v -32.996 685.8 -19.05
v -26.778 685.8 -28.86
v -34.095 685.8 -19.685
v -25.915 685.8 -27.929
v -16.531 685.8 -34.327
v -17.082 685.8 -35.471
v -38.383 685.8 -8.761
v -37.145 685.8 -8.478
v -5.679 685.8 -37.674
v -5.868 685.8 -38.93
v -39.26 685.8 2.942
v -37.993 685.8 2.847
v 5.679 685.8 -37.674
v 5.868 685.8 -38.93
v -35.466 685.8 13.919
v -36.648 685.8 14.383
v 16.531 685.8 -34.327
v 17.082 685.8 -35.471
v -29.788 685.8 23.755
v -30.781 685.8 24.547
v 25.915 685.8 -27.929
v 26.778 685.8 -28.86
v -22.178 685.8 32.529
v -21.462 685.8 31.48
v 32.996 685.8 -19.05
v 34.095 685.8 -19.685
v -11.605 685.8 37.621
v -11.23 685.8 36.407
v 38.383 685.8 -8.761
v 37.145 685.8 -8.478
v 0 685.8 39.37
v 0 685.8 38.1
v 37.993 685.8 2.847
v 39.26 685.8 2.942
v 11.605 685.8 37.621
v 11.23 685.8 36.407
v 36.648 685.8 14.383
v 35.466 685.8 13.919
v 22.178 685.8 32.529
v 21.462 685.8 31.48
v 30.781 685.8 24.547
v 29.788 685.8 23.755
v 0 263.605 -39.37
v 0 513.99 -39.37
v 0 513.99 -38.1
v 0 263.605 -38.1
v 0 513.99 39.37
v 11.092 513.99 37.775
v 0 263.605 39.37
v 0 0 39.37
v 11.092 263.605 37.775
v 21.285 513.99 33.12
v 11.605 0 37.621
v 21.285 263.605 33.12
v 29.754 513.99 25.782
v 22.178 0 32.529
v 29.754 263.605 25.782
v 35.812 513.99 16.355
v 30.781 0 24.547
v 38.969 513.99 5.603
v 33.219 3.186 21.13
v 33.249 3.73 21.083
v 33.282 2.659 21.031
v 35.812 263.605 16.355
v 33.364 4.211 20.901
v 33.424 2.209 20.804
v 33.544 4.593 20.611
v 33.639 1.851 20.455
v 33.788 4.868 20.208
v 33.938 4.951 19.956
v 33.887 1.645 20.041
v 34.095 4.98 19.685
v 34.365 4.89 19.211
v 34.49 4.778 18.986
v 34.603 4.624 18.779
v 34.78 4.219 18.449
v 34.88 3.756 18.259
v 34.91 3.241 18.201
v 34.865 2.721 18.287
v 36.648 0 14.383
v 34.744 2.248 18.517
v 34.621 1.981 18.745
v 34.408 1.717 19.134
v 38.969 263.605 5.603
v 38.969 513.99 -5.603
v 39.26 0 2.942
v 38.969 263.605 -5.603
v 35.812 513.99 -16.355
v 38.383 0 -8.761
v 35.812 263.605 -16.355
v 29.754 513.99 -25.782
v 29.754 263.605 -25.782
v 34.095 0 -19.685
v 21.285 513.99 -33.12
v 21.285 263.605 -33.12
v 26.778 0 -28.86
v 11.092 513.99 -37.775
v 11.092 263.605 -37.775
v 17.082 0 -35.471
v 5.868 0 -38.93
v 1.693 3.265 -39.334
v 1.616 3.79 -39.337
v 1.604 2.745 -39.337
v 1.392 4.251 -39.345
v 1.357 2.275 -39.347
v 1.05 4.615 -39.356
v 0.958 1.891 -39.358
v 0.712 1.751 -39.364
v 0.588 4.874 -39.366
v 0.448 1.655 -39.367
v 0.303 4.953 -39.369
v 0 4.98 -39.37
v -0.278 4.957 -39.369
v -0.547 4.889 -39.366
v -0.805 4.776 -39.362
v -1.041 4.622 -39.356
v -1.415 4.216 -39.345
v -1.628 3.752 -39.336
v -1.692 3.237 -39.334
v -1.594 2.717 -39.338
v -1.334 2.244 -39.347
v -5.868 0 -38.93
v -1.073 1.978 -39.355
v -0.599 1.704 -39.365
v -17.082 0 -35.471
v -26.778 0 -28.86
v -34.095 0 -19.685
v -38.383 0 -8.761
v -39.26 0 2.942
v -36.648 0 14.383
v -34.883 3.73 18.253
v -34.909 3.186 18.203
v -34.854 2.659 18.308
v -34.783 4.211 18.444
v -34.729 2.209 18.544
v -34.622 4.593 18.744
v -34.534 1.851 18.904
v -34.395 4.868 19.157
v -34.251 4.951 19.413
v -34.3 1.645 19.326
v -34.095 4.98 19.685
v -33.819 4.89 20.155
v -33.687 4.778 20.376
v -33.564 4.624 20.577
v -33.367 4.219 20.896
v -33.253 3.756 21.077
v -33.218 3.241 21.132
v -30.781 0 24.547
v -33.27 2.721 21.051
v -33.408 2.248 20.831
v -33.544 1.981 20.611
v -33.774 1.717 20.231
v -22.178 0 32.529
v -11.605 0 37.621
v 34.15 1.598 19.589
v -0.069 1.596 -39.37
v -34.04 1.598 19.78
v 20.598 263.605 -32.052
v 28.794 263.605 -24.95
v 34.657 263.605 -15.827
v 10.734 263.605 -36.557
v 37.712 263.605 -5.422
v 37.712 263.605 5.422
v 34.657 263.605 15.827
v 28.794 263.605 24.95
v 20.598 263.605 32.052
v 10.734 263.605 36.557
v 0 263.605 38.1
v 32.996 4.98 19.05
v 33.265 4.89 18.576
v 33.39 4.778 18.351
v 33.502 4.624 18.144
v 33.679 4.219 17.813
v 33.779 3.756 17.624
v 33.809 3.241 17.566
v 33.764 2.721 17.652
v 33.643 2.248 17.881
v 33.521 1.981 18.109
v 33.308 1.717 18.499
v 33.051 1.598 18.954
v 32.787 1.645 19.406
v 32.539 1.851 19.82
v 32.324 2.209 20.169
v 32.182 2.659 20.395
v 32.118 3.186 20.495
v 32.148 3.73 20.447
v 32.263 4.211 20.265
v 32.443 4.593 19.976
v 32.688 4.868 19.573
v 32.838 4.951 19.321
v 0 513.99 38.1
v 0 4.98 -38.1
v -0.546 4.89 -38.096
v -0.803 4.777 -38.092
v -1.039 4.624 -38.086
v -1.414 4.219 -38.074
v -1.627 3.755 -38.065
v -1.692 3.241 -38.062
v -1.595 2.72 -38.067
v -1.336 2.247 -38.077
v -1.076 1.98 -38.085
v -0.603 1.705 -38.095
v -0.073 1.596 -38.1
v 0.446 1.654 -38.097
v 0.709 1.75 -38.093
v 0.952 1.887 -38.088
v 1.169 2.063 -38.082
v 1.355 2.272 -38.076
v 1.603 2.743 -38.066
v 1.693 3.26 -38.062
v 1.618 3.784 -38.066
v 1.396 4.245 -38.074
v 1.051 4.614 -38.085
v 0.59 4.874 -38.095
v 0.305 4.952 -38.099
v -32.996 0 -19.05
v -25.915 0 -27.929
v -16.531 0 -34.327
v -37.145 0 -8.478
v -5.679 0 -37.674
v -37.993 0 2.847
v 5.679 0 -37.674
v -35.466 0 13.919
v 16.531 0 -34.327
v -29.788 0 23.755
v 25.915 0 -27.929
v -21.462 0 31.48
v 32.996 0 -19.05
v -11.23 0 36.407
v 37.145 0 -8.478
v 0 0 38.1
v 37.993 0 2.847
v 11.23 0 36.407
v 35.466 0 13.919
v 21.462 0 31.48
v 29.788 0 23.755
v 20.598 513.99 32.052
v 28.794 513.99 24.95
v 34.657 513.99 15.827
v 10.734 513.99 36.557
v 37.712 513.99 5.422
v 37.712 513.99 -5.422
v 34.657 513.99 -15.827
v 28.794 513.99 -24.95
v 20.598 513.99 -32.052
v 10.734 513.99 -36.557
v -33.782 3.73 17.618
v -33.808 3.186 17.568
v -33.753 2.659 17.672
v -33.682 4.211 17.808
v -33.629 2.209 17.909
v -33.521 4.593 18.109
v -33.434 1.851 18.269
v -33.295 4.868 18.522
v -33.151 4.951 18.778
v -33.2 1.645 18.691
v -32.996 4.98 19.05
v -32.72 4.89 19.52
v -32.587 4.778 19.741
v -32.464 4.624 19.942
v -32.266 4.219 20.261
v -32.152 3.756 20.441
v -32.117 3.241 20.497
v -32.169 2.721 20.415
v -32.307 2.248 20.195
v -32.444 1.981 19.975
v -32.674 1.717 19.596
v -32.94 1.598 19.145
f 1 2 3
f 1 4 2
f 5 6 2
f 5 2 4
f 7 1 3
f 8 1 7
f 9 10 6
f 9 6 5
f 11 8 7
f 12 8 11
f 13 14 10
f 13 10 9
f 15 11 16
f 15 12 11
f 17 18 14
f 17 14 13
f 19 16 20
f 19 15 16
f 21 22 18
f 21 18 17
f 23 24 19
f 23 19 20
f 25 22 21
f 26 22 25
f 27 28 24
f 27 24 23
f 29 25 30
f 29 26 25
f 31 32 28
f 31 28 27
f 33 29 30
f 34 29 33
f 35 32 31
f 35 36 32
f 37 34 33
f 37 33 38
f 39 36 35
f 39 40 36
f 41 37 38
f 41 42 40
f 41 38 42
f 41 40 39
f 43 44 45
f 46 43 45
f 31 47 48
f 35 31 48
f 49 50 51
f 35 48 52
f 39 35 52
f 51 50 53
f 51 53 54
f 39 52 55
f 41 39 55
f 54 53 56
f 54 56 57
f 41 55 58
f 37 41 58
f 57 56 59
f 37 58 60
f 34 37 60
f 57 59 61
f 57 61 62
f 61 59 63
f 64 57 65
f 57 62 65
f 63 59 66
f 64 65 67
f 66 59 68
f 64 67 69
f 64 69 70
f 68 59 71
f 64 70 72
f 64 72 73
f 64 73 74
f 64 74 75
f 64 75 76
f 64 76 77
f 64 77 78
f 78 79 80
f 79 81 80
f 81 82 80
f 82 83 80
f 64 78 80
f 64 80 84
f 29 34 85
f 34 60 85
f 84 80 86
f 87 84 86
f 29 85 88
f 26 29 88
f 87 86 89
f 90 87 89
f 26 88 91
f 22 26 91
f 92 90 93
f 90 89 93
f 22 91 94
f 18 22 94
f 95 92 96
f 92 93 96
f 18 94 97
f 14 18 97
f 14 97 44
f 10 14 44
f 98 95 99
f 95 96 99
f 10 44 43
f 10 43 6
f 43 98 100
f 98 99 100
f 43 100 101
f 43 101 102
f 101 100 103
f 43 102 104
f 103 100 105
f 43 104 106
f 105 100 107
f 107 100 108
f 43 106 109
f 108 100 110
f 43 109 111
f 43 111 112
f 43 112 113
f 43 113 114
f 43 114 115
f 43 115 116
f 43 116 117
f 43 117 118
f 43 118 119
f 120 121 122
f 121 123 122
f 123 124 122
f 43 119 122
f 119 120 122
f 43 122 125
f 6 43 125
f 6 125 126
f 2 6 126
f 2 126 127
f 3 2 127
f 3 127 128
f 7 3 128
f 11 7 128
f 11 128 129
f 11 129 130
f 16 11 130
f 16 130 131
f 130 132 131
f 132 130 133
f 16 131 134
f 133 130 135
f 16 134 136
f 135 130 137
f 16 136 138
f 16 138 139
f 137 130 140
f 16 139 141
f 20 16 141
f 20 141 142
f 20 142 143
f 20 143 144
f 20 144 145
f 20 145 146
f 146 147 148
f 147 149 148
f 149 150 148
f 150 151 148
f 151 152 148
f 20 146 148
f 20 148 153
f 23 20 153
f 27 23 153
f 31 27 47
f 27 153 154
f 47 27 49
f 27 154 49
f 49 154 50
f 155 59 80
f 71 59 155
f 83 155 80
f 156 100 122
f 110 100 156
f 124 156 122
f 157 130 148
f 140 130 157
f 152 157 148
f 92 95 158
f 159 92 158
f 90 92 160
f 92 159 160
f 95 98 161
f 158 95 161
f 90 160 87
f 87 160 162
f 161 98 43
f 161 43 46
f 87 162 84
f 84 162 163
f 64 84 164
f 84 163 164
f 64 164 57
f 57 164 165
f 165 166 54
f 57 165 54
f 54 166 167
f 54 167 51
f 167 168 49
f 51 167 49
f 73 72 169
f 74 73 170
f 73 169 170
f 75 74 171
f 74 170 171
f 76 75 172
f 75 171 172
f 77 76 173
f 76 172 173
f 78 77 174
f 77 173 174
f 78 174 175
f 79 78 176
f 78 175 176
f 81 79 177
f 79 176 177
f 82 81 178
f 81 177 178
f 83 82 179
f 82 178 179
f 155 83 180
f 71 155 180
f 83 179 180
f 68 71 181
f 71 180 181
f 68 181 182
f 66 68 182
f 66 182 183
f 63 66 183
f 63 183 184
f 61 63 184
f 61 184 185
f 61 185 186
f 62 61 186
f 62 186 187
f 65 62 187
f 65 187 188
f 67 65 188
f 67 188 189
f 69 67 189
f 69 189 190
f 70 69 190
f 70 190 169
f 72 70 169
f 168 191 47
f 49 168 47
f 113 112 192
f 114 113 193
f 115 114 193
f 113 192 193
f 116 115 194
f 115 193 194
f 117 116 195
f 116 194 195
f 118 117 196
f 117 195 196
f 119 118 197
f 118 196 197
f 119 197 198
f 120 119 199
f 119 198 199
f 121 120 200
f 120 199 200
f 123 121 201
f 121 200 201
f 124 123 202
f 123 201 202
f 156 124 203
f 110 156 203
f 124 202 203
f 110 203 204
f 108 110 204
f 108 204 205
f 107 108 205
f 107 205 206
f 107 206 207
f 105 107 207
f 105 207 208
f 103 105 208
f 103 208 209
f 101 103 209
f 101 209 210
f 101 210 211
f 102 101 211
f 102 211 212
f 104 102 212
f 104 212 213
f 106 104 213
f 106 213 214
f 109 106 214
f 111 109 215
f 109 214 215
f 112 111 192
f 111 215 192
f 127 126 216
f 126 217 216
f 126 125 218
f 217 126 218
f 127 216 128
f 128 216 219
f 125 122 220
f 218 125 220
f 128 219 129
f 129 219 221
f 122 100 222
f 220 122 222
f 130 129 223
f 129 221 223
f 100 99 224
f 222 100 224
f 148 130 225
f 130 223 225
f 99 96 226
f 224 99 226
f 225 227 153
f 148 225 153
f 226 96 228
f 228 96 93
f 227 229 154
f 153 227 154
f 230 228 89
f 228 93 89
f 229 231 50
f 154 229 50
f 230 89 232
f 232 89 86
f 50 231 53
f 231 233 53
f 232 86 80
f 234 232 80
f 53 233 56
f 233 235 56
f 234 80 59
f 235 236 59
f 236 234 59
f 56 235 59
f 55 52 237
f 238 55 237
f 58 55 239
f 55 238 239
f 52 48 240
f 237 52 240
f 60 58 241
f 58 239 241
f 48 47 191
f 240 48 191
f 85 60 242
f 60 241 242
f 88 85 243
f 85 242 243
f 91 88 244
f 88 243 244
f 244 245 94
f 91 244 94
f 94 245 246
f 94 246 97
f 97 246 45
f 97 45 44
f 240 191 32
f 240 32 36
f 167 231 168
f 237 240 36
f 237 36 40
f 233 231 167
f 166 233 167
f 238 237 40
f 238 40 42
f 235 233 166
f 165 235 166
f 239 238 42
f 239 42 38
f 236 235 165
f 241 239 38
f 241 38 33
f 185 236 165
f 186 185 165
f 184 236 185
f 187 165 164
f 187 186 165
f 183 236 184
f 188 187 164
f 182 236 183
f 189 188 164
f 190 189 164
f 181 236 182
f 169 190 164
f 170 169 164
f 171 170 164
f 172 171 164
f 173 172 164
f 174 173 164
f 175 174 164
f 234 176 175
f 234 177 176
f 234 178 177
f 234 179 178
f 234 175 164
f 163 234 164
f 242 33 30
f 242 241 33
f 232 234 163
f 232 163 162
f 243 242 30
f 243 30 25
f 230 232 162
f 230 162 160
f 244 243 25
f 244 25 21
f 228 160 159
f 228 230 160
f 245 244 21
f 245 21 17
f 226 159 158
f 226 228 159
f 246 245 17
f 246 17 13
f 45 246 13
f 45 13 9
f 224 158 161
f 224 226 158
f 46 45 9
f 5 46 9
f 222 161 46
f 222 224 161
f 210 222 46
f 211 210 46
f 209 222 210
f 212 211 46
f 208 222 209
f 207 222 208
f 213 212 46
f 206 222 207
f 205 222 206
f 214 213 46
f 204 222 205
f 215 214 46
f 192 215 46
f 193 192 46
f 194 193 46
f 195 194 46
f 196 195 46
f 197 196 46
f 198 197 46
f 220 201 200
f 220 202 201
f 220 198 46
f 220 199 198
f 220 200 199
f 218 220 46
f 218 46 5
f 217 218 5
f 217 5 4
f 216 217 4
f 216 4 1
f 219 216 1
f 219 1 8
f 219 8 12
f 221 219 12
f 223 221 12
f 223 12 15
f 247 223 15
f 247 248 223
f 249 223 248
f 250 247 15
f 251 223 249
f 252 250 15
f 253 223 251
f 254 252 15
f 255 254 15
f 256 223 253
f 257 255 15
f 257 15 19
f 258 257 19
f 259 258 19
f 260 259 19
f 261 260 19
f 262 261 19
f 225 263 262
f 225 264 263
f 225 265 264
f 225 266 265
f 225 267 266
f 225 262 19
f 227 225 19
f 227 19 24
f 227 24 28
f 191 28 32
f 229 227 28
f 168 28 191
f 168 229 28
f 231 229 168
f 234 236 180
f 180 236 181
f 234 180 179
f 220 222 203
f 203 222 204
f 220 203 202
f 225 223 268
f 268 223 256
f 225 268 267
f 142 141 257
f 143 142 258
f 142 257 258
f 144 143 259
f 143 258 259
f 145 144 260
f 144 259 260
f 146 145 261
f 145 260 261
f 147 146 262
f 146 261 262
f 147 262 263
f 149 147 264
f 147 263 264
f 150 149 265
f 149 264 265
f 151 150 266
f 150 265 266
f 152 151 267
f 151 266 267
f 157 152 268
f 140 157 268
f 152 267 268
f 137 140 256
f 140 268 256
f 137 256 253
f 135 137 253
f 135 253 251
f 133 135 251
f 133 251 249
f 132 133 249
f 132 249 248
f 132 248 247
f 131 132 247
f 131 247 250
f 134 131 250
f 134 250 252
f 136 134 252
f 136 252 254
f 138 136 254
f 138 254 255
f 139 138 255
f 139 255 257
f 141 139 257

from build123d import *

# Parameters (mm, degrees)
SKETCH1_R           = 39.37
SKETCH1_R_2         = 38.1
BOSS_EXTRUDE1_DEPTH = 685.8
SKETCH2_R           = 1.692869147
CUT_EXTRUDE1_DEPTH  = 61.4
CIRPATTERN3_COUNT   = 3
CUT_EXTRUDE2_DEPTH  = 72.4


with BuildPart() as part:
    # Sketch1 → Boss-Extrude1 (new body)
    with BuildSketch(Plane(origin=(0, 0, 0), x_dir=(1, 0, 0), z_dir=(0, 1, 0))):
        with Locations(Location((0, 0, 0), (0, 0, 270))):
            Circle(SKETCH1_R)
        with Locations(Location((0, 0, 0), (0, 0, 270))):
            Circle(SKETCH1_R_2, mode=Mode.SUBTRACT)
    extrude(amount=BOSS_EXTRUDE1_DEPTH)

    # Sketch2 → Cut-Extrude1 (cut)
    with BuildSketch(Plane.XY):
        with Locations(Location((0, 3.287142885, 0), (0, 0, 90))):
            Circle(SKETCH2_R)
    cut_extrude1 = extrude(amount=-CUT_EXTRUDE1_DEPTH, mode=Mode.SUBTRACT)

    # CirPattern3: Cut-Extrude1 ×3 about axis
    cirpattern3_axis = Axis((0, 0, 0), (0, -1, 0))
    for i in range(1, CIRPATTERN3_COUNT):
        add(cut_extrude1.rotate(cirpattern3_axis, i * 360 / CIRPATTERN3_COUNT), mode=Mode.SUBTRACT)

    # Sketch3 → Cut-Extrude2 (cut)
    with BuildSketch(Plane(origin=(0, 0, 0), x_dir=(0, 0, -1), z_dir=(1, 0, 0))):
        Polygon((-39.37, 513.990392655), (39.37, 513.990392655), (39.37, 282.655028446), (39.37, 269.955028446), (39.37, 263.605028446), (-39.37, 263.605028446), (-39.37, 269.955028446), (-39.37, 276.305028446), (-39.37, 282.655028446), align=None)
    extrude(amount=CUT_EXTRUDE2_DEPTH, mode=Mode.SUBTRACT)


solid = part.part
